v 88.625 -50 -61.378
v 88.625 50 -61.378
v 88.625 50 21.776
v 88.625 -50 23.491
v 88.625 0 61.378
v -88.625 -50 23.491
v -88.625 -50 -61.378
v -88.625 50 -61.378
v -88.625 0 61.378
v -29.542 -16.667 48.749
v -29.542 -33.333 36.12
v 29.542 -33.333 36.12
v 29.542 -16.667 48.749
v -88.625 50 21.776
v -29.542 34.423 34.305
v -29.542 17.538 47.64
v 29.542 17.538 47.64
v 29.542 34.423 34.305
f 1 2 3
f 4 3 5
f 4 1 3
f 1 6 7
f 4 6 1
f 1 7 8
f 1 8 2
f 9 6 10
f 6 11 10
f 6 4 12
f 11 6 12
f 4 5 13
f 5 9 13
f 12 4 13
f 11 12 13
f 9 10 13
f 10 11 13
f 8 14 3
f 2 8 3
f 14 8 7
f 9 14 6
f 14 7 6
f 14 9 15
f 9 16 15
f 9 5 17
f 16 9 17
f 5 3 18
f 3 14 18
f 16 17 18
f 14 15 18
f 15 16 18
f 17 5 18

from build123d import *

# Parameters (mm, degrees)
F0_W     = 177.2500127554
F0_H     = 122.755214572
F1_DEPTH = 50
F3_DEPTH = 281.4


with BuildPart() as f1:
    # F0 (on Front) → F1 (new body, symmetric)
    with BuildSketch(Plane.XZ):
        Rectangle(F0_W, F0_H)
    extrude(amount=F1_DEPTH, both=True)

    # F2 (on face) → F3 (cut)
    with BuildSketch(Plane.YZ.offset(88.6250063777)):
        with BuildLine():
            Line((-50, 61.377607286), (-50, 23.49149121))
            add(Edge.make_bspline(
                [(-50, 23.49149121), (-33.3333333333, 36.1201965687), (-16.6666666667, 48.7489019273), (0, 61.377607286)],
                knots=[14.2716320074, 14.2716320074, 14.2716320074, 14.2716320074, 77.0040621478, 77.0040621478, 77.0040621478, 77.0040621478], degree=3))
            Line((0, 61.377607286), (-50, 61.377607286))
        make_face()
        with BuildLine():
            Line((50, 61.377607286), (0, 61.377607286))
            add(Edge.make_bspline(
                [(0, 61.377607286), (17.6472838318, 47.5731034788), (35.2945676635, 33.7685996716), (50, 21.7761076418)],
                knots=[0, 0, 0, 0, 0.483085928, 0.483085928, 0.483085928, 0.483085928], degree=3))
            Line((50, 21.7761076418), (50, 61.377607286))
        make_face()
    extrude(amount=-F3_DEPTH, mode=Mode.SUBTRACT)


solid = f1.part
